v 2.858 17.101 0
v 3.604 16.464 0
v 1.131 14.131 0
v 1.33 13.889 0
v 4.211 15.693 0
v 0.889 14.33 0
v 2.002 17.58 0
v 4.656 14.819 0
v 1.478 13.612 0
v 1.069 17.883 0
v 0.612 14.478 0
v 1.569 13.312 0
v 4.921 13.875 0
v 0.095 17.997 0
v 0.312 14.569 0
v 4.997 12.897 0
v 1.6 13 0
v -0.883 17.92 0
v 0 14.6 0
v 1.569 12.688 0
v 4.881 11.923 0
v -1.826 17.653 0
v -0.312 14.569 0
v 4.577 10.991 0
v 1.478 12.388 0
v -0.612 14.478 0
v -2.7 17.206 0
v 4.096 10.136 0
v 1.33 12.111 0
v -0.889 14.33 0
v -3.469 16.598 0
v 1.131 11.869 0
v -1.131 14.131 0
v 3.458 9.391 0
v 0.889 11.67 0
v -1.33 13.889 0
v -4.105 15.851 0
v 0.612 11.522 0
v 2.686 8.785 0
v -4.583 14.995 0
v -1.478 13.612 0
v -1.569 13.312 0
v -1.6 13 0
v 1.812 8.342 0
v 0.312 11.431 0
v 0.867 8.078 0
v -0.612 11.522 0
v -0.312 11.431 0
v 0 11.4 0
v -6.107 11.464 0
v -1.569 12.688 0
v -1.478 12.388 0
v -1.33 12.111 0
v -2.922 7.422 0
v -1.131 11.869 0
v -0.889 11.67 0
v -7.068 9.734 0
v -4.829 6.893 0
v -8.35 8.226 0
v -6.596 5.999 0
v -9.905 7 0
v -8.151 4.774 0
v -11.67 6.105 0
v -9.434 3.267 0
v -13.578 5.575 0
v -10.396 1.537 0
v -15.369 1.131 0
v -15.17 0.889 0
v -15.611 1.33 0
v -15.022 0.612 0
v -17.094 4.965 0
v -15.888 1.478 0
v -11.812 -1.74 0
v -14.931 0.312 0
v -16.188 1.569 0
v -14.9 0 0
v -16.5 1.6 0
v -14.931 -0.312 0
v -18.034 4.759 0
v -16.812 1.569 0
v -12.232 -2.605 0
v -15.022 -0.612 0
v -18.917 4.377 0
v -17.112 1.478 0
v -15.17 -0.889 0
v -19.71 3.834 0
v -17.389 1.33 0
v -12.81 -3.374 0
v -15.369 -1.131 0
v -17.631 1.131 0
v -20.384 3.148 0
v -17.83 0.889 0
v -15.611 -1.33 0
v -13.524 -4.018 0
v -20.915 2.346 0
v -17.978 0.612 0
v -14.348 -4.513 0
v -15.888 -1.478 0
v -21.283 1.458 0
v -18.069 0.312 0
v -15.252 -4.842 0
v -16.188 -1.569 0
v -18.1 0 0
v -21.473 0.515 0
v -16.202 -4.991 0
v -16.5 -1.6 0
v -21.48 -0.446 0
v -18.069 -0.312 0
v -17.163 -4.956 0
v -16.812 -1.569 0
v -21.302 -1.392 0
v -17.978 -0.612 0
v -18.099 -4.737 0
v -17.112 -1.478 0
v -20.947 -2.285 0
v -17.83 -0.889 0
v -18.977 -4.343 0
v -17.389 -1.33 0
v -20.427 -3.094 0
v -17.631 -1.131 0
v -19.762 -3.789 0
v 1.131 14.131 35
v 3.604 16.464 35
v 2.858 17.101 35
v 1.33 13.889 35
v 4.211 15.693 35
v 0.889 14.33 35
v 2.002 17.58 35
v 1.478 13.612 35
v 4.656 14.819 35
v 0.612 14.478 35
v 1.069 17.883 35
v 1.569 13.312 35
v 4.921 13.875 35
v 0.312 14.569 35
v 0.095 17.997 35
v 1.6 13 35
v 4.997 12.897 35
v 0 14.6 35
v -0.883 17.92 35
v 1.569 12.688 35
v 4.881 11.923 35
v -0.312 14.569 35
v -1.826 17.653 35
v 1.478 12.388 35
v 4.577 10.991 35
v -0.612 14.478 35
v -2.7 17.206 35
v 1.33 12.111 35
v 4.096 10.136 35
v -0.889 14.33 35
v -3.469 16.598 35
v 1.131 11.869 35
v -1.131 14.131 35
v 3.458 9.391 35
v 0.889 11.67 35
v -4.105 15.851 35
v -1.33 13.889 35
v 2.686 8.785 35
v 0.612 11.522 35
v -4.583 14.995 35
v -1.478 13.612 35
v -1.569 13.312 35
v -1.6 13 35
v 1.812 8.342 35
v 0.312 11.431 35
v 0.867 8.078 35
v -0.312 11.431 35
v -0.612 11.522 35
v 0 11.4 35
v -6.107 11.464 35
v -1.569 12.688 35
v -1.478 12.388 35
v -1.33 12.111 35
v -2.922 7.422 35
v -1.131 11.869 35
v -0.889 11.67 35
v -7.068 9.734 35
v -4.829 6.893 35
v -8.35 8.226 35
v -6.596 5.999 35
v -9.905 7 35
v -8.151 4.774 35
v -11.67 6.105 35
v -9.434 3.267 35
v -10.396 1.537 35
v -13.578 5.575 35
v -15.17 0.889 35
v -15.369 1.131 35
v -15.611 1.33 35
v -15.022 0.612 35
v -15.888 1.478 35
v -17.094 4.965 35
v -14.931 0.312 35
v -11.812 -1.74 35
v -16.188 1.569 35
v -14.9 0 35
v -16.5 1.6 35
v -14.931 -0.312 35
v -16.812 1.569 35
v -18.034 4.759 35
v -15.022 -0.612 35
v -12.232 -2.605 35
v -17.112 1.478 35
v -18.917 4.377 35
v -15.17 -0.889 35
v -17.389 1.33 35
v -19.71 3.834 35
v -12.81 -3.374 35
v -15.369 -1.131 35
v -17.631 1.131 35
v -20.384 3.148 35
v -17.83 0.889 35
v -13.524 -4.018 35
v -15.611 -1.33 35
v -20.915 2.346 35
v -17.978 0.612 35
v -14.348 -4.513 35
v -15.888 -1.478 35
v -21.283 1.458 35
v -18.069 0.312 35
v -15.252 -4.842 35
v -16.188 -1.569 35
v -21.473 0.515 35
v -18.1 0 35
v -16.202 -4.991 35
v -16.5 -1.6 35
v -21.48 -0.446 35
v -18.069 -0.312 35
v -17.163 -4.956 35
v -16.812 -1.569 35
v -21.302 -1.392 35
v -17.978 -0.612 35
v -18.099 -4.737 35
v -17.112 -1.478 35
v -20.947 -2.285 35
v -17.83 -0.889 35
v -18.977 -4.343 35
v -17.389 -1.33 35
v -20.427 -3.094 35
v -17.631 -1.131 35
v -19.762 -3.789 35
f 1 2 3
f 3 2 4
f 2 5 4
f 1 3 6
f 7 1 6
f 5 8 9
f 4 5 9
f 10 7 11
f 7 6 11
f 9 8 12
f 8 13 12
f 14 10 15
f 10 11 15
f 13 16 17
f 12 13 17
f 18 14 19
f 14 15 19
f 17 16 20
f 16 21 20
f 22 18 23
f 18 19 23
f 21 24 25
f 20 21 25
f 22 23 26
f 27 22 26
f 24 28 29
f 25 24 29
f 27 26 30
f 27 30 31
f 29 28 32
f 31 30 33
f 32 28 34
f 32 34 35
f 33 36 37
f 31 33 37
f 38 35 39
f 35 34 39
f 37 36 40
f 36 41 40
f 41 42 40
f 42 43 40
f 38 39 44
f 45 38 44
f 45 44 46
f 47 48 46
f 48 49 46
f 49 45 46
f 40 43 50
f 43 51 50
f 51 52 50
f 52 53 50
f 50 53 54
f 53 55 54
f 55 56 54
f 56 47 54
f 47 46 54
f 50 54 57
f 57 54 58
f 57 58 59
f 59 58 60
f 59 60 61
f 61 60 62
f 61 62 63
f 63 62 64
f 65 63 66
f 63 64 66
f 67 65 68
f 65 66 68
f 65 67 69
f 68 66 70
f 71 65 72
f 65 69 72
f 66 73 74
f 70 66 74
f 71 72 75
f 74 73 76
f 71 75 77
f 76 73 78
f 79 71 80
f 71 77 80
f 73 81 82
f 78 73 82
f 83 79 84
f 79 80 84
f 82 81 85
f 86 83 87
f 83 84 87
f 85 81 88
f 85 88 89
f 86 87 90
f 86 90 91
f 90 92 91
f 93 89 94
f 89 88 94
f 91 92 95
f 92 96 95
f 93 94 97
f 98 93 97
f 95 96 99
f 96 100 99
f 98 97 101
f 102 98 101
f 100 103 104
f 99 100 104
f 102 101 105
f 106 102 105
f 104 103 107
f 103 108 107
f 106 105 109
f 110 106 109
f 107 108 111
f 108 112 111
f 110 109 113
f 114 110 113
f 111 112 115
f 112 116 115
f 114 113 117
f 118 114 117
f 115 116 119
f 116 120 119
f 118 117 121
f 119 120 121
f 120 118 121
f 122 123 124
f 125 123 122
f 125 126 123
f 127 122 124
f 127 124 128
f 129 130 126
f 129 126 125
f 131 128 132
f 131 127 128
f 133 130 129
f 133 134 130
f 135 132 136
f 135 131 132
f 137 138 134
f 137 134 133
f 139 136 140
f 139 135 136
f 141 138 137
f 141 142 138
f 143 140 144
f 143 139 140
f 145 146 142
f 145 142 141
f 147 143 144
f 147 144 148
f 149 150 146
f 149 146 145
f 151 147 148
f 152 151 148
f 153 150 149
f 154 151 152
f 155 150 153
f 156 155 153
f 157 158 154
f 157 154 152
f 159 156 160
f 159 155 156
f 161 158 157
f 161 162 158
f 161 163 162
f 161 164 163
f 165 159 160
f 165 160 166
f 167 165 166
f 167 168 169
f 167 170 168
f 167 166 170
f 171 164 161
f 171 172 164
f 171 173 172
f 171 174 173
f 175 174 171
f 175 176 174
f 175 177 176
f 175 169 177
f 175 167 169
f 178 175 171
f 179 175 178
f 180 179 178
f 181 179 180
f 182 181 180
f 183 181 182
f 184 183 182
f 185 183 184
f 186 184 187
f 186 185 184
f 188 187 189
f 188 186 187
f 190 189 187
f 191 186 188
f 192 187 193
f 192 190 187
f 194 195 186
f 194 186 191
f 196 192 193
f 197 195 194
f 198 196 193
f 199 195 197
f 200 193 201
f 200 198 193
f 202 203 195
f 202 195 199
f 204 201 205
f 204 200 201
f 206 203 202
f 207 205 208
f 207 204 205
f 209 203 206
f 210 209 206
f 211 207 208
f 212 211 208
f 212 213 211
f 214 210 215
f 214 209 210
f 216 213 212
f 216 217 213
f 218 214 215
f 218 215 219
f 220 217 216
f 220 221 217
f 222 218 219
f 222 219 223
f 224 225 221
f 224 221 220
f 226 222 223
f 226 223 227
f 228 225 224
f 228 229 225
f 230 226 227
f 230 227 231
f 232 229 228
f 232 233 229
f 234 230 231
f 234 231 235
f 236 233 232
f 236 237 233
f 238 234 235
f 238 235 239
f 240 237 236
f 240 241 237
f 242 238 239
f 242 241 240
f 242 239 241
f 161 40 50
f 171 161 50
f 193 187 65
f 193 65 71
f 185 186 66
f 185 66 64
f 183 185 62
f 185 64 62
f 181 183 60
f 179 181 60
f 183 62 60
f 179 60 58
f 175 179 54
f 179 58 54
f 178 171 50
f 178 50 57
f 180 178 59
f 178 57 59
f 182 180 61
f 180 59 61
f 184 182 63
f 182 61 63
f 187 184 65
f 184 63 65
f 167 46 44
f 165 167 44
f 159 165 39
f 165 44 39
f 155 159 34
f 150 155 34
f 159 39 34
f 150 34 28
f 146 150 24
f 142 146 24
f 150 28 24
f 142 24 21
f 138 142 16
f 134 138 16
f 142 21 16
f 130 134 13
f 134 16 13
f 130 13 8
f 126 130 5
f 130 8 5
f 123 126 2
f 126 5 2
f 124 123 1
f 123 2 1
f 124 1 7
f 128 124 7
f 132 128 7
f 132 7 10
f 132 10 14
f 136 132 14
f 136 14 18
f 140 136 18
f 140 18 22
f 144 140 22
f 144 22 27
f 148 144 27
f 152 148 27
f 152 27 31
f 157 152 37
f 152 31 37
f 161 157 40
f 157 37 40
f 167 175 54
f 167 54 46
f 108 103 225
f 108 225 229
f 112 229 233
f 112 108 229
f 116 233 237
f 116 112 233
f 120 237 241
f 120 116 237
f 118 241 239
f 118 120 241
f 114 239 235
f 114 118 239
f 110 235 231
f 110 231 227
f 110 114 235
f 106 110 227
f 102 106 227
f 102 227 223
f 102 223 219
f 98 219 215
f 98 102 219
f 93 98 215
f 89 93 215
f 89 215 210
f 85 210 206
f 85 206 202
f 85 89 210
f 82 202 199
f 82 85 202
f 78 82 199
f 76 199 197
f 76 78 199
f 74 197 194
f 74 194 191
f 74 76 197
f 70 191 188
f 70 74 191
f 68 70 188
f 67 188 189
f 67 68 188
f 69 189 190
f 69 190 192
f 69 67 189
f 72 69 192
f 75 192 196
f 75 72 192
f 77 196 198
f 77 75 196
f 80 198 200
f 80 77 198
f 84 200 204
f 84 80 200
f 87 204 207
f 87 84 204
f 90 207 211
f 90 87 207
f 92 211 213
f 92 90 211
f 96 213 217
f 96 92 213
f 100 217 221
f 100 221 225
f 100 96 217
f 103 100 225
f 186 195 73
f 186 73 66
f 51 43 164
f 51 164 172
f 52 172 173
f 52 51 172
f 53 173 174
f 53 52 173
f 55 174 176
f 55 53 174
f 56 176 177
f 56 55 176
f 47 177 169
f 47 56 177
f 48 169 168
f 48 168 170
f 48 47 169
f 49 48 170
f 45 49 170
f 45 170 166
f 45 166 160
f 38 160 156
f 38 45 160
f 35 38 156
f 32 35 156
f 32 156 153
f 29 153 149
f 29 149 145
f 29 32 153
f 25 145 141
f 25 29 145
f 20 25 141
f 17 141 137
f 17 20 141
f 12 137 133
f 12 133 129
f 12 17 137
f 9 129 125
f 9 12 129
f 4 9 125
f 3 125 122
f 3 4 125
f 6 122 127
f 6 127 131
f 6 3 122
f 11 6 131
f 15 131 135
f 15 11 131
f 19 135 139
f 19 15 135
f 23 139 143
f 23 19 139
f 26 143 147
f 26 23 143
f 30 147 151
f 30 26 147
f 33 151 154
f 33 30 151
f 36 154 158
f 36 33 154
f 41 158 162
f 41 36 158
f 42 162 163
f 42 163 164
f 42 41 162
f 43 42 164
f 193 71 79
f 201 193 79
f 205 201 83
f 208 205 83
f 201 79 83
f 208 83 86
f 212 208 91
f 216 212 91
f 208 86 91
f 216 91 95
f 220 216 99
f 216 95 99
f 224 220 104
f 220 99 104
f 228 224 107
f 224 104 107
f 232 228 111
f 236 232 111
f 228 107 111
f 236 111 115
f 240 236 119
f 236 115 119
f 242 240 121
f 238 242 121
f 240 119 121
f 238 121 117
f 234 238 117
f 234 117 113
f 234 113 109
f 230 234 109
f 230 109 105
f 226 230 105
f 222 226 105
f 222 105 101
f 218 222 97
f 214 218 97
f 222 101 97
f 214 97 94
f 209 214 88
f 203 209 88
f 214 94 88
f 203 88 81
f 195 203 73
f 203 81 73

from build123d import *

# Parameters (mm, degrees)
SKETCH1_R           = 1.6
BOSS_EXTRUDE1_DEPTH = 35


with BuildPart() as part:
    # Sketch1 → Boss-Extrude1 (new body)
    with BuildSketch(Plane(origin=(0, 0, 0), x_dir=(-1, 0, 0), z_dir=(0, 0, 1))):
        with BuildLine():
            ThreePointArc((6.106952435, -11.464428538), (9.097104038, -7.574548586), (13.577547372, -5.575098618))
            Line((13.577547372, -5.575098618), (17.094474376, -4.96453424))
            ThreePointArc((17.094474376, -4.96453424), (20.427458361, 3.094361133), (11.812394993, 1.739643439))
            Line((11.812394993, 1.739643439), (10.395840134, -1.536777892))
            ThreePointArc((10.395840134, -1.536777892), (7.403500619, -5.424975016), (2.921933136, -7.421904043))
            Line((2.921933136, -7.421904043), (-0.867040687, -8.0775021))
            ThreePointArc((-0.867040687, -8.0775021), (-3.926102771, -16.093293092), (4.58295671, -14.994806488))
            Line((4.58295671, -14.994806488), (6.106952435, -11.464428538))
        make_face()
        with Locations((0, -13)):
            Circle(SKETCH1_R, mode=Mode.SUBTRACT)
        with Locations((16.5, 0)):
            Circle(SKETCH1_R, mode=Mode.SUBTRACT)
    extrude(amount=BOSS_EXTRUDE1_DEPTH)


solid = part.part
